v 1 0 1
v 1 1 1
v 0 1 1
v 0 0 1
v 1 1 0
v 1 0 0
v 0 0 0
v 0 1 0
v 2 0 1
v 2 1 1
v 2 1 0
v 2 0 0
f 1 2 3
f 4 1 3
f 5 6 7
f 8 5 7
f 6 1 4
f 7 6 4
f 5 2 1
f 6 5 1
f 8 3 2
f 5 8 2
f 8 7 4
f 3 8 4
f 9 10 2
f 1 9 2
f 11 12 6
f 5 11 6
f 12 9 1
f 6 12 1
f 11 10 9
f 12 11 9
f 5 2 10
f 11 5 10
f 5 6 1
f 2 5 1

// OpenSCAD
polyhedron(
  points=[
    [0, 0, 0],
    [1, 0, 0],
    [0, 1, 0],
    [1, 1, 0],
    [0, 0, 1],
    [1, 0, 1],
    [0, 1, 1],
    [1, 1, 1],

    [1, 0, 0],
    [2, 0, 0],
    [1, 1, 0],
    [2, 1, 0],
    [1, 0, 1],
    [2, 0, 1],
    [1, 1, 1],
    [2, 1, 1],
  ],
  faces=[
    [6,7,5],[6,5,4],
    [0,1,3],[0,3,2],
    [4,5,1],[4,1,0],
    [5,7,3],[5,3,1],
    [7,6,2],[7,2,3],
    [4,0,2],[4,2,6],
    [14,15,13],[14,13,12],
    [8,9,11],[8,11,10],
    [12,13,9],[12,9,8],
    [13,15,11],[13,11,9],
    [15,14,10],[15,10,11],
    [12,8,10],[12,10,14],
  ]);
